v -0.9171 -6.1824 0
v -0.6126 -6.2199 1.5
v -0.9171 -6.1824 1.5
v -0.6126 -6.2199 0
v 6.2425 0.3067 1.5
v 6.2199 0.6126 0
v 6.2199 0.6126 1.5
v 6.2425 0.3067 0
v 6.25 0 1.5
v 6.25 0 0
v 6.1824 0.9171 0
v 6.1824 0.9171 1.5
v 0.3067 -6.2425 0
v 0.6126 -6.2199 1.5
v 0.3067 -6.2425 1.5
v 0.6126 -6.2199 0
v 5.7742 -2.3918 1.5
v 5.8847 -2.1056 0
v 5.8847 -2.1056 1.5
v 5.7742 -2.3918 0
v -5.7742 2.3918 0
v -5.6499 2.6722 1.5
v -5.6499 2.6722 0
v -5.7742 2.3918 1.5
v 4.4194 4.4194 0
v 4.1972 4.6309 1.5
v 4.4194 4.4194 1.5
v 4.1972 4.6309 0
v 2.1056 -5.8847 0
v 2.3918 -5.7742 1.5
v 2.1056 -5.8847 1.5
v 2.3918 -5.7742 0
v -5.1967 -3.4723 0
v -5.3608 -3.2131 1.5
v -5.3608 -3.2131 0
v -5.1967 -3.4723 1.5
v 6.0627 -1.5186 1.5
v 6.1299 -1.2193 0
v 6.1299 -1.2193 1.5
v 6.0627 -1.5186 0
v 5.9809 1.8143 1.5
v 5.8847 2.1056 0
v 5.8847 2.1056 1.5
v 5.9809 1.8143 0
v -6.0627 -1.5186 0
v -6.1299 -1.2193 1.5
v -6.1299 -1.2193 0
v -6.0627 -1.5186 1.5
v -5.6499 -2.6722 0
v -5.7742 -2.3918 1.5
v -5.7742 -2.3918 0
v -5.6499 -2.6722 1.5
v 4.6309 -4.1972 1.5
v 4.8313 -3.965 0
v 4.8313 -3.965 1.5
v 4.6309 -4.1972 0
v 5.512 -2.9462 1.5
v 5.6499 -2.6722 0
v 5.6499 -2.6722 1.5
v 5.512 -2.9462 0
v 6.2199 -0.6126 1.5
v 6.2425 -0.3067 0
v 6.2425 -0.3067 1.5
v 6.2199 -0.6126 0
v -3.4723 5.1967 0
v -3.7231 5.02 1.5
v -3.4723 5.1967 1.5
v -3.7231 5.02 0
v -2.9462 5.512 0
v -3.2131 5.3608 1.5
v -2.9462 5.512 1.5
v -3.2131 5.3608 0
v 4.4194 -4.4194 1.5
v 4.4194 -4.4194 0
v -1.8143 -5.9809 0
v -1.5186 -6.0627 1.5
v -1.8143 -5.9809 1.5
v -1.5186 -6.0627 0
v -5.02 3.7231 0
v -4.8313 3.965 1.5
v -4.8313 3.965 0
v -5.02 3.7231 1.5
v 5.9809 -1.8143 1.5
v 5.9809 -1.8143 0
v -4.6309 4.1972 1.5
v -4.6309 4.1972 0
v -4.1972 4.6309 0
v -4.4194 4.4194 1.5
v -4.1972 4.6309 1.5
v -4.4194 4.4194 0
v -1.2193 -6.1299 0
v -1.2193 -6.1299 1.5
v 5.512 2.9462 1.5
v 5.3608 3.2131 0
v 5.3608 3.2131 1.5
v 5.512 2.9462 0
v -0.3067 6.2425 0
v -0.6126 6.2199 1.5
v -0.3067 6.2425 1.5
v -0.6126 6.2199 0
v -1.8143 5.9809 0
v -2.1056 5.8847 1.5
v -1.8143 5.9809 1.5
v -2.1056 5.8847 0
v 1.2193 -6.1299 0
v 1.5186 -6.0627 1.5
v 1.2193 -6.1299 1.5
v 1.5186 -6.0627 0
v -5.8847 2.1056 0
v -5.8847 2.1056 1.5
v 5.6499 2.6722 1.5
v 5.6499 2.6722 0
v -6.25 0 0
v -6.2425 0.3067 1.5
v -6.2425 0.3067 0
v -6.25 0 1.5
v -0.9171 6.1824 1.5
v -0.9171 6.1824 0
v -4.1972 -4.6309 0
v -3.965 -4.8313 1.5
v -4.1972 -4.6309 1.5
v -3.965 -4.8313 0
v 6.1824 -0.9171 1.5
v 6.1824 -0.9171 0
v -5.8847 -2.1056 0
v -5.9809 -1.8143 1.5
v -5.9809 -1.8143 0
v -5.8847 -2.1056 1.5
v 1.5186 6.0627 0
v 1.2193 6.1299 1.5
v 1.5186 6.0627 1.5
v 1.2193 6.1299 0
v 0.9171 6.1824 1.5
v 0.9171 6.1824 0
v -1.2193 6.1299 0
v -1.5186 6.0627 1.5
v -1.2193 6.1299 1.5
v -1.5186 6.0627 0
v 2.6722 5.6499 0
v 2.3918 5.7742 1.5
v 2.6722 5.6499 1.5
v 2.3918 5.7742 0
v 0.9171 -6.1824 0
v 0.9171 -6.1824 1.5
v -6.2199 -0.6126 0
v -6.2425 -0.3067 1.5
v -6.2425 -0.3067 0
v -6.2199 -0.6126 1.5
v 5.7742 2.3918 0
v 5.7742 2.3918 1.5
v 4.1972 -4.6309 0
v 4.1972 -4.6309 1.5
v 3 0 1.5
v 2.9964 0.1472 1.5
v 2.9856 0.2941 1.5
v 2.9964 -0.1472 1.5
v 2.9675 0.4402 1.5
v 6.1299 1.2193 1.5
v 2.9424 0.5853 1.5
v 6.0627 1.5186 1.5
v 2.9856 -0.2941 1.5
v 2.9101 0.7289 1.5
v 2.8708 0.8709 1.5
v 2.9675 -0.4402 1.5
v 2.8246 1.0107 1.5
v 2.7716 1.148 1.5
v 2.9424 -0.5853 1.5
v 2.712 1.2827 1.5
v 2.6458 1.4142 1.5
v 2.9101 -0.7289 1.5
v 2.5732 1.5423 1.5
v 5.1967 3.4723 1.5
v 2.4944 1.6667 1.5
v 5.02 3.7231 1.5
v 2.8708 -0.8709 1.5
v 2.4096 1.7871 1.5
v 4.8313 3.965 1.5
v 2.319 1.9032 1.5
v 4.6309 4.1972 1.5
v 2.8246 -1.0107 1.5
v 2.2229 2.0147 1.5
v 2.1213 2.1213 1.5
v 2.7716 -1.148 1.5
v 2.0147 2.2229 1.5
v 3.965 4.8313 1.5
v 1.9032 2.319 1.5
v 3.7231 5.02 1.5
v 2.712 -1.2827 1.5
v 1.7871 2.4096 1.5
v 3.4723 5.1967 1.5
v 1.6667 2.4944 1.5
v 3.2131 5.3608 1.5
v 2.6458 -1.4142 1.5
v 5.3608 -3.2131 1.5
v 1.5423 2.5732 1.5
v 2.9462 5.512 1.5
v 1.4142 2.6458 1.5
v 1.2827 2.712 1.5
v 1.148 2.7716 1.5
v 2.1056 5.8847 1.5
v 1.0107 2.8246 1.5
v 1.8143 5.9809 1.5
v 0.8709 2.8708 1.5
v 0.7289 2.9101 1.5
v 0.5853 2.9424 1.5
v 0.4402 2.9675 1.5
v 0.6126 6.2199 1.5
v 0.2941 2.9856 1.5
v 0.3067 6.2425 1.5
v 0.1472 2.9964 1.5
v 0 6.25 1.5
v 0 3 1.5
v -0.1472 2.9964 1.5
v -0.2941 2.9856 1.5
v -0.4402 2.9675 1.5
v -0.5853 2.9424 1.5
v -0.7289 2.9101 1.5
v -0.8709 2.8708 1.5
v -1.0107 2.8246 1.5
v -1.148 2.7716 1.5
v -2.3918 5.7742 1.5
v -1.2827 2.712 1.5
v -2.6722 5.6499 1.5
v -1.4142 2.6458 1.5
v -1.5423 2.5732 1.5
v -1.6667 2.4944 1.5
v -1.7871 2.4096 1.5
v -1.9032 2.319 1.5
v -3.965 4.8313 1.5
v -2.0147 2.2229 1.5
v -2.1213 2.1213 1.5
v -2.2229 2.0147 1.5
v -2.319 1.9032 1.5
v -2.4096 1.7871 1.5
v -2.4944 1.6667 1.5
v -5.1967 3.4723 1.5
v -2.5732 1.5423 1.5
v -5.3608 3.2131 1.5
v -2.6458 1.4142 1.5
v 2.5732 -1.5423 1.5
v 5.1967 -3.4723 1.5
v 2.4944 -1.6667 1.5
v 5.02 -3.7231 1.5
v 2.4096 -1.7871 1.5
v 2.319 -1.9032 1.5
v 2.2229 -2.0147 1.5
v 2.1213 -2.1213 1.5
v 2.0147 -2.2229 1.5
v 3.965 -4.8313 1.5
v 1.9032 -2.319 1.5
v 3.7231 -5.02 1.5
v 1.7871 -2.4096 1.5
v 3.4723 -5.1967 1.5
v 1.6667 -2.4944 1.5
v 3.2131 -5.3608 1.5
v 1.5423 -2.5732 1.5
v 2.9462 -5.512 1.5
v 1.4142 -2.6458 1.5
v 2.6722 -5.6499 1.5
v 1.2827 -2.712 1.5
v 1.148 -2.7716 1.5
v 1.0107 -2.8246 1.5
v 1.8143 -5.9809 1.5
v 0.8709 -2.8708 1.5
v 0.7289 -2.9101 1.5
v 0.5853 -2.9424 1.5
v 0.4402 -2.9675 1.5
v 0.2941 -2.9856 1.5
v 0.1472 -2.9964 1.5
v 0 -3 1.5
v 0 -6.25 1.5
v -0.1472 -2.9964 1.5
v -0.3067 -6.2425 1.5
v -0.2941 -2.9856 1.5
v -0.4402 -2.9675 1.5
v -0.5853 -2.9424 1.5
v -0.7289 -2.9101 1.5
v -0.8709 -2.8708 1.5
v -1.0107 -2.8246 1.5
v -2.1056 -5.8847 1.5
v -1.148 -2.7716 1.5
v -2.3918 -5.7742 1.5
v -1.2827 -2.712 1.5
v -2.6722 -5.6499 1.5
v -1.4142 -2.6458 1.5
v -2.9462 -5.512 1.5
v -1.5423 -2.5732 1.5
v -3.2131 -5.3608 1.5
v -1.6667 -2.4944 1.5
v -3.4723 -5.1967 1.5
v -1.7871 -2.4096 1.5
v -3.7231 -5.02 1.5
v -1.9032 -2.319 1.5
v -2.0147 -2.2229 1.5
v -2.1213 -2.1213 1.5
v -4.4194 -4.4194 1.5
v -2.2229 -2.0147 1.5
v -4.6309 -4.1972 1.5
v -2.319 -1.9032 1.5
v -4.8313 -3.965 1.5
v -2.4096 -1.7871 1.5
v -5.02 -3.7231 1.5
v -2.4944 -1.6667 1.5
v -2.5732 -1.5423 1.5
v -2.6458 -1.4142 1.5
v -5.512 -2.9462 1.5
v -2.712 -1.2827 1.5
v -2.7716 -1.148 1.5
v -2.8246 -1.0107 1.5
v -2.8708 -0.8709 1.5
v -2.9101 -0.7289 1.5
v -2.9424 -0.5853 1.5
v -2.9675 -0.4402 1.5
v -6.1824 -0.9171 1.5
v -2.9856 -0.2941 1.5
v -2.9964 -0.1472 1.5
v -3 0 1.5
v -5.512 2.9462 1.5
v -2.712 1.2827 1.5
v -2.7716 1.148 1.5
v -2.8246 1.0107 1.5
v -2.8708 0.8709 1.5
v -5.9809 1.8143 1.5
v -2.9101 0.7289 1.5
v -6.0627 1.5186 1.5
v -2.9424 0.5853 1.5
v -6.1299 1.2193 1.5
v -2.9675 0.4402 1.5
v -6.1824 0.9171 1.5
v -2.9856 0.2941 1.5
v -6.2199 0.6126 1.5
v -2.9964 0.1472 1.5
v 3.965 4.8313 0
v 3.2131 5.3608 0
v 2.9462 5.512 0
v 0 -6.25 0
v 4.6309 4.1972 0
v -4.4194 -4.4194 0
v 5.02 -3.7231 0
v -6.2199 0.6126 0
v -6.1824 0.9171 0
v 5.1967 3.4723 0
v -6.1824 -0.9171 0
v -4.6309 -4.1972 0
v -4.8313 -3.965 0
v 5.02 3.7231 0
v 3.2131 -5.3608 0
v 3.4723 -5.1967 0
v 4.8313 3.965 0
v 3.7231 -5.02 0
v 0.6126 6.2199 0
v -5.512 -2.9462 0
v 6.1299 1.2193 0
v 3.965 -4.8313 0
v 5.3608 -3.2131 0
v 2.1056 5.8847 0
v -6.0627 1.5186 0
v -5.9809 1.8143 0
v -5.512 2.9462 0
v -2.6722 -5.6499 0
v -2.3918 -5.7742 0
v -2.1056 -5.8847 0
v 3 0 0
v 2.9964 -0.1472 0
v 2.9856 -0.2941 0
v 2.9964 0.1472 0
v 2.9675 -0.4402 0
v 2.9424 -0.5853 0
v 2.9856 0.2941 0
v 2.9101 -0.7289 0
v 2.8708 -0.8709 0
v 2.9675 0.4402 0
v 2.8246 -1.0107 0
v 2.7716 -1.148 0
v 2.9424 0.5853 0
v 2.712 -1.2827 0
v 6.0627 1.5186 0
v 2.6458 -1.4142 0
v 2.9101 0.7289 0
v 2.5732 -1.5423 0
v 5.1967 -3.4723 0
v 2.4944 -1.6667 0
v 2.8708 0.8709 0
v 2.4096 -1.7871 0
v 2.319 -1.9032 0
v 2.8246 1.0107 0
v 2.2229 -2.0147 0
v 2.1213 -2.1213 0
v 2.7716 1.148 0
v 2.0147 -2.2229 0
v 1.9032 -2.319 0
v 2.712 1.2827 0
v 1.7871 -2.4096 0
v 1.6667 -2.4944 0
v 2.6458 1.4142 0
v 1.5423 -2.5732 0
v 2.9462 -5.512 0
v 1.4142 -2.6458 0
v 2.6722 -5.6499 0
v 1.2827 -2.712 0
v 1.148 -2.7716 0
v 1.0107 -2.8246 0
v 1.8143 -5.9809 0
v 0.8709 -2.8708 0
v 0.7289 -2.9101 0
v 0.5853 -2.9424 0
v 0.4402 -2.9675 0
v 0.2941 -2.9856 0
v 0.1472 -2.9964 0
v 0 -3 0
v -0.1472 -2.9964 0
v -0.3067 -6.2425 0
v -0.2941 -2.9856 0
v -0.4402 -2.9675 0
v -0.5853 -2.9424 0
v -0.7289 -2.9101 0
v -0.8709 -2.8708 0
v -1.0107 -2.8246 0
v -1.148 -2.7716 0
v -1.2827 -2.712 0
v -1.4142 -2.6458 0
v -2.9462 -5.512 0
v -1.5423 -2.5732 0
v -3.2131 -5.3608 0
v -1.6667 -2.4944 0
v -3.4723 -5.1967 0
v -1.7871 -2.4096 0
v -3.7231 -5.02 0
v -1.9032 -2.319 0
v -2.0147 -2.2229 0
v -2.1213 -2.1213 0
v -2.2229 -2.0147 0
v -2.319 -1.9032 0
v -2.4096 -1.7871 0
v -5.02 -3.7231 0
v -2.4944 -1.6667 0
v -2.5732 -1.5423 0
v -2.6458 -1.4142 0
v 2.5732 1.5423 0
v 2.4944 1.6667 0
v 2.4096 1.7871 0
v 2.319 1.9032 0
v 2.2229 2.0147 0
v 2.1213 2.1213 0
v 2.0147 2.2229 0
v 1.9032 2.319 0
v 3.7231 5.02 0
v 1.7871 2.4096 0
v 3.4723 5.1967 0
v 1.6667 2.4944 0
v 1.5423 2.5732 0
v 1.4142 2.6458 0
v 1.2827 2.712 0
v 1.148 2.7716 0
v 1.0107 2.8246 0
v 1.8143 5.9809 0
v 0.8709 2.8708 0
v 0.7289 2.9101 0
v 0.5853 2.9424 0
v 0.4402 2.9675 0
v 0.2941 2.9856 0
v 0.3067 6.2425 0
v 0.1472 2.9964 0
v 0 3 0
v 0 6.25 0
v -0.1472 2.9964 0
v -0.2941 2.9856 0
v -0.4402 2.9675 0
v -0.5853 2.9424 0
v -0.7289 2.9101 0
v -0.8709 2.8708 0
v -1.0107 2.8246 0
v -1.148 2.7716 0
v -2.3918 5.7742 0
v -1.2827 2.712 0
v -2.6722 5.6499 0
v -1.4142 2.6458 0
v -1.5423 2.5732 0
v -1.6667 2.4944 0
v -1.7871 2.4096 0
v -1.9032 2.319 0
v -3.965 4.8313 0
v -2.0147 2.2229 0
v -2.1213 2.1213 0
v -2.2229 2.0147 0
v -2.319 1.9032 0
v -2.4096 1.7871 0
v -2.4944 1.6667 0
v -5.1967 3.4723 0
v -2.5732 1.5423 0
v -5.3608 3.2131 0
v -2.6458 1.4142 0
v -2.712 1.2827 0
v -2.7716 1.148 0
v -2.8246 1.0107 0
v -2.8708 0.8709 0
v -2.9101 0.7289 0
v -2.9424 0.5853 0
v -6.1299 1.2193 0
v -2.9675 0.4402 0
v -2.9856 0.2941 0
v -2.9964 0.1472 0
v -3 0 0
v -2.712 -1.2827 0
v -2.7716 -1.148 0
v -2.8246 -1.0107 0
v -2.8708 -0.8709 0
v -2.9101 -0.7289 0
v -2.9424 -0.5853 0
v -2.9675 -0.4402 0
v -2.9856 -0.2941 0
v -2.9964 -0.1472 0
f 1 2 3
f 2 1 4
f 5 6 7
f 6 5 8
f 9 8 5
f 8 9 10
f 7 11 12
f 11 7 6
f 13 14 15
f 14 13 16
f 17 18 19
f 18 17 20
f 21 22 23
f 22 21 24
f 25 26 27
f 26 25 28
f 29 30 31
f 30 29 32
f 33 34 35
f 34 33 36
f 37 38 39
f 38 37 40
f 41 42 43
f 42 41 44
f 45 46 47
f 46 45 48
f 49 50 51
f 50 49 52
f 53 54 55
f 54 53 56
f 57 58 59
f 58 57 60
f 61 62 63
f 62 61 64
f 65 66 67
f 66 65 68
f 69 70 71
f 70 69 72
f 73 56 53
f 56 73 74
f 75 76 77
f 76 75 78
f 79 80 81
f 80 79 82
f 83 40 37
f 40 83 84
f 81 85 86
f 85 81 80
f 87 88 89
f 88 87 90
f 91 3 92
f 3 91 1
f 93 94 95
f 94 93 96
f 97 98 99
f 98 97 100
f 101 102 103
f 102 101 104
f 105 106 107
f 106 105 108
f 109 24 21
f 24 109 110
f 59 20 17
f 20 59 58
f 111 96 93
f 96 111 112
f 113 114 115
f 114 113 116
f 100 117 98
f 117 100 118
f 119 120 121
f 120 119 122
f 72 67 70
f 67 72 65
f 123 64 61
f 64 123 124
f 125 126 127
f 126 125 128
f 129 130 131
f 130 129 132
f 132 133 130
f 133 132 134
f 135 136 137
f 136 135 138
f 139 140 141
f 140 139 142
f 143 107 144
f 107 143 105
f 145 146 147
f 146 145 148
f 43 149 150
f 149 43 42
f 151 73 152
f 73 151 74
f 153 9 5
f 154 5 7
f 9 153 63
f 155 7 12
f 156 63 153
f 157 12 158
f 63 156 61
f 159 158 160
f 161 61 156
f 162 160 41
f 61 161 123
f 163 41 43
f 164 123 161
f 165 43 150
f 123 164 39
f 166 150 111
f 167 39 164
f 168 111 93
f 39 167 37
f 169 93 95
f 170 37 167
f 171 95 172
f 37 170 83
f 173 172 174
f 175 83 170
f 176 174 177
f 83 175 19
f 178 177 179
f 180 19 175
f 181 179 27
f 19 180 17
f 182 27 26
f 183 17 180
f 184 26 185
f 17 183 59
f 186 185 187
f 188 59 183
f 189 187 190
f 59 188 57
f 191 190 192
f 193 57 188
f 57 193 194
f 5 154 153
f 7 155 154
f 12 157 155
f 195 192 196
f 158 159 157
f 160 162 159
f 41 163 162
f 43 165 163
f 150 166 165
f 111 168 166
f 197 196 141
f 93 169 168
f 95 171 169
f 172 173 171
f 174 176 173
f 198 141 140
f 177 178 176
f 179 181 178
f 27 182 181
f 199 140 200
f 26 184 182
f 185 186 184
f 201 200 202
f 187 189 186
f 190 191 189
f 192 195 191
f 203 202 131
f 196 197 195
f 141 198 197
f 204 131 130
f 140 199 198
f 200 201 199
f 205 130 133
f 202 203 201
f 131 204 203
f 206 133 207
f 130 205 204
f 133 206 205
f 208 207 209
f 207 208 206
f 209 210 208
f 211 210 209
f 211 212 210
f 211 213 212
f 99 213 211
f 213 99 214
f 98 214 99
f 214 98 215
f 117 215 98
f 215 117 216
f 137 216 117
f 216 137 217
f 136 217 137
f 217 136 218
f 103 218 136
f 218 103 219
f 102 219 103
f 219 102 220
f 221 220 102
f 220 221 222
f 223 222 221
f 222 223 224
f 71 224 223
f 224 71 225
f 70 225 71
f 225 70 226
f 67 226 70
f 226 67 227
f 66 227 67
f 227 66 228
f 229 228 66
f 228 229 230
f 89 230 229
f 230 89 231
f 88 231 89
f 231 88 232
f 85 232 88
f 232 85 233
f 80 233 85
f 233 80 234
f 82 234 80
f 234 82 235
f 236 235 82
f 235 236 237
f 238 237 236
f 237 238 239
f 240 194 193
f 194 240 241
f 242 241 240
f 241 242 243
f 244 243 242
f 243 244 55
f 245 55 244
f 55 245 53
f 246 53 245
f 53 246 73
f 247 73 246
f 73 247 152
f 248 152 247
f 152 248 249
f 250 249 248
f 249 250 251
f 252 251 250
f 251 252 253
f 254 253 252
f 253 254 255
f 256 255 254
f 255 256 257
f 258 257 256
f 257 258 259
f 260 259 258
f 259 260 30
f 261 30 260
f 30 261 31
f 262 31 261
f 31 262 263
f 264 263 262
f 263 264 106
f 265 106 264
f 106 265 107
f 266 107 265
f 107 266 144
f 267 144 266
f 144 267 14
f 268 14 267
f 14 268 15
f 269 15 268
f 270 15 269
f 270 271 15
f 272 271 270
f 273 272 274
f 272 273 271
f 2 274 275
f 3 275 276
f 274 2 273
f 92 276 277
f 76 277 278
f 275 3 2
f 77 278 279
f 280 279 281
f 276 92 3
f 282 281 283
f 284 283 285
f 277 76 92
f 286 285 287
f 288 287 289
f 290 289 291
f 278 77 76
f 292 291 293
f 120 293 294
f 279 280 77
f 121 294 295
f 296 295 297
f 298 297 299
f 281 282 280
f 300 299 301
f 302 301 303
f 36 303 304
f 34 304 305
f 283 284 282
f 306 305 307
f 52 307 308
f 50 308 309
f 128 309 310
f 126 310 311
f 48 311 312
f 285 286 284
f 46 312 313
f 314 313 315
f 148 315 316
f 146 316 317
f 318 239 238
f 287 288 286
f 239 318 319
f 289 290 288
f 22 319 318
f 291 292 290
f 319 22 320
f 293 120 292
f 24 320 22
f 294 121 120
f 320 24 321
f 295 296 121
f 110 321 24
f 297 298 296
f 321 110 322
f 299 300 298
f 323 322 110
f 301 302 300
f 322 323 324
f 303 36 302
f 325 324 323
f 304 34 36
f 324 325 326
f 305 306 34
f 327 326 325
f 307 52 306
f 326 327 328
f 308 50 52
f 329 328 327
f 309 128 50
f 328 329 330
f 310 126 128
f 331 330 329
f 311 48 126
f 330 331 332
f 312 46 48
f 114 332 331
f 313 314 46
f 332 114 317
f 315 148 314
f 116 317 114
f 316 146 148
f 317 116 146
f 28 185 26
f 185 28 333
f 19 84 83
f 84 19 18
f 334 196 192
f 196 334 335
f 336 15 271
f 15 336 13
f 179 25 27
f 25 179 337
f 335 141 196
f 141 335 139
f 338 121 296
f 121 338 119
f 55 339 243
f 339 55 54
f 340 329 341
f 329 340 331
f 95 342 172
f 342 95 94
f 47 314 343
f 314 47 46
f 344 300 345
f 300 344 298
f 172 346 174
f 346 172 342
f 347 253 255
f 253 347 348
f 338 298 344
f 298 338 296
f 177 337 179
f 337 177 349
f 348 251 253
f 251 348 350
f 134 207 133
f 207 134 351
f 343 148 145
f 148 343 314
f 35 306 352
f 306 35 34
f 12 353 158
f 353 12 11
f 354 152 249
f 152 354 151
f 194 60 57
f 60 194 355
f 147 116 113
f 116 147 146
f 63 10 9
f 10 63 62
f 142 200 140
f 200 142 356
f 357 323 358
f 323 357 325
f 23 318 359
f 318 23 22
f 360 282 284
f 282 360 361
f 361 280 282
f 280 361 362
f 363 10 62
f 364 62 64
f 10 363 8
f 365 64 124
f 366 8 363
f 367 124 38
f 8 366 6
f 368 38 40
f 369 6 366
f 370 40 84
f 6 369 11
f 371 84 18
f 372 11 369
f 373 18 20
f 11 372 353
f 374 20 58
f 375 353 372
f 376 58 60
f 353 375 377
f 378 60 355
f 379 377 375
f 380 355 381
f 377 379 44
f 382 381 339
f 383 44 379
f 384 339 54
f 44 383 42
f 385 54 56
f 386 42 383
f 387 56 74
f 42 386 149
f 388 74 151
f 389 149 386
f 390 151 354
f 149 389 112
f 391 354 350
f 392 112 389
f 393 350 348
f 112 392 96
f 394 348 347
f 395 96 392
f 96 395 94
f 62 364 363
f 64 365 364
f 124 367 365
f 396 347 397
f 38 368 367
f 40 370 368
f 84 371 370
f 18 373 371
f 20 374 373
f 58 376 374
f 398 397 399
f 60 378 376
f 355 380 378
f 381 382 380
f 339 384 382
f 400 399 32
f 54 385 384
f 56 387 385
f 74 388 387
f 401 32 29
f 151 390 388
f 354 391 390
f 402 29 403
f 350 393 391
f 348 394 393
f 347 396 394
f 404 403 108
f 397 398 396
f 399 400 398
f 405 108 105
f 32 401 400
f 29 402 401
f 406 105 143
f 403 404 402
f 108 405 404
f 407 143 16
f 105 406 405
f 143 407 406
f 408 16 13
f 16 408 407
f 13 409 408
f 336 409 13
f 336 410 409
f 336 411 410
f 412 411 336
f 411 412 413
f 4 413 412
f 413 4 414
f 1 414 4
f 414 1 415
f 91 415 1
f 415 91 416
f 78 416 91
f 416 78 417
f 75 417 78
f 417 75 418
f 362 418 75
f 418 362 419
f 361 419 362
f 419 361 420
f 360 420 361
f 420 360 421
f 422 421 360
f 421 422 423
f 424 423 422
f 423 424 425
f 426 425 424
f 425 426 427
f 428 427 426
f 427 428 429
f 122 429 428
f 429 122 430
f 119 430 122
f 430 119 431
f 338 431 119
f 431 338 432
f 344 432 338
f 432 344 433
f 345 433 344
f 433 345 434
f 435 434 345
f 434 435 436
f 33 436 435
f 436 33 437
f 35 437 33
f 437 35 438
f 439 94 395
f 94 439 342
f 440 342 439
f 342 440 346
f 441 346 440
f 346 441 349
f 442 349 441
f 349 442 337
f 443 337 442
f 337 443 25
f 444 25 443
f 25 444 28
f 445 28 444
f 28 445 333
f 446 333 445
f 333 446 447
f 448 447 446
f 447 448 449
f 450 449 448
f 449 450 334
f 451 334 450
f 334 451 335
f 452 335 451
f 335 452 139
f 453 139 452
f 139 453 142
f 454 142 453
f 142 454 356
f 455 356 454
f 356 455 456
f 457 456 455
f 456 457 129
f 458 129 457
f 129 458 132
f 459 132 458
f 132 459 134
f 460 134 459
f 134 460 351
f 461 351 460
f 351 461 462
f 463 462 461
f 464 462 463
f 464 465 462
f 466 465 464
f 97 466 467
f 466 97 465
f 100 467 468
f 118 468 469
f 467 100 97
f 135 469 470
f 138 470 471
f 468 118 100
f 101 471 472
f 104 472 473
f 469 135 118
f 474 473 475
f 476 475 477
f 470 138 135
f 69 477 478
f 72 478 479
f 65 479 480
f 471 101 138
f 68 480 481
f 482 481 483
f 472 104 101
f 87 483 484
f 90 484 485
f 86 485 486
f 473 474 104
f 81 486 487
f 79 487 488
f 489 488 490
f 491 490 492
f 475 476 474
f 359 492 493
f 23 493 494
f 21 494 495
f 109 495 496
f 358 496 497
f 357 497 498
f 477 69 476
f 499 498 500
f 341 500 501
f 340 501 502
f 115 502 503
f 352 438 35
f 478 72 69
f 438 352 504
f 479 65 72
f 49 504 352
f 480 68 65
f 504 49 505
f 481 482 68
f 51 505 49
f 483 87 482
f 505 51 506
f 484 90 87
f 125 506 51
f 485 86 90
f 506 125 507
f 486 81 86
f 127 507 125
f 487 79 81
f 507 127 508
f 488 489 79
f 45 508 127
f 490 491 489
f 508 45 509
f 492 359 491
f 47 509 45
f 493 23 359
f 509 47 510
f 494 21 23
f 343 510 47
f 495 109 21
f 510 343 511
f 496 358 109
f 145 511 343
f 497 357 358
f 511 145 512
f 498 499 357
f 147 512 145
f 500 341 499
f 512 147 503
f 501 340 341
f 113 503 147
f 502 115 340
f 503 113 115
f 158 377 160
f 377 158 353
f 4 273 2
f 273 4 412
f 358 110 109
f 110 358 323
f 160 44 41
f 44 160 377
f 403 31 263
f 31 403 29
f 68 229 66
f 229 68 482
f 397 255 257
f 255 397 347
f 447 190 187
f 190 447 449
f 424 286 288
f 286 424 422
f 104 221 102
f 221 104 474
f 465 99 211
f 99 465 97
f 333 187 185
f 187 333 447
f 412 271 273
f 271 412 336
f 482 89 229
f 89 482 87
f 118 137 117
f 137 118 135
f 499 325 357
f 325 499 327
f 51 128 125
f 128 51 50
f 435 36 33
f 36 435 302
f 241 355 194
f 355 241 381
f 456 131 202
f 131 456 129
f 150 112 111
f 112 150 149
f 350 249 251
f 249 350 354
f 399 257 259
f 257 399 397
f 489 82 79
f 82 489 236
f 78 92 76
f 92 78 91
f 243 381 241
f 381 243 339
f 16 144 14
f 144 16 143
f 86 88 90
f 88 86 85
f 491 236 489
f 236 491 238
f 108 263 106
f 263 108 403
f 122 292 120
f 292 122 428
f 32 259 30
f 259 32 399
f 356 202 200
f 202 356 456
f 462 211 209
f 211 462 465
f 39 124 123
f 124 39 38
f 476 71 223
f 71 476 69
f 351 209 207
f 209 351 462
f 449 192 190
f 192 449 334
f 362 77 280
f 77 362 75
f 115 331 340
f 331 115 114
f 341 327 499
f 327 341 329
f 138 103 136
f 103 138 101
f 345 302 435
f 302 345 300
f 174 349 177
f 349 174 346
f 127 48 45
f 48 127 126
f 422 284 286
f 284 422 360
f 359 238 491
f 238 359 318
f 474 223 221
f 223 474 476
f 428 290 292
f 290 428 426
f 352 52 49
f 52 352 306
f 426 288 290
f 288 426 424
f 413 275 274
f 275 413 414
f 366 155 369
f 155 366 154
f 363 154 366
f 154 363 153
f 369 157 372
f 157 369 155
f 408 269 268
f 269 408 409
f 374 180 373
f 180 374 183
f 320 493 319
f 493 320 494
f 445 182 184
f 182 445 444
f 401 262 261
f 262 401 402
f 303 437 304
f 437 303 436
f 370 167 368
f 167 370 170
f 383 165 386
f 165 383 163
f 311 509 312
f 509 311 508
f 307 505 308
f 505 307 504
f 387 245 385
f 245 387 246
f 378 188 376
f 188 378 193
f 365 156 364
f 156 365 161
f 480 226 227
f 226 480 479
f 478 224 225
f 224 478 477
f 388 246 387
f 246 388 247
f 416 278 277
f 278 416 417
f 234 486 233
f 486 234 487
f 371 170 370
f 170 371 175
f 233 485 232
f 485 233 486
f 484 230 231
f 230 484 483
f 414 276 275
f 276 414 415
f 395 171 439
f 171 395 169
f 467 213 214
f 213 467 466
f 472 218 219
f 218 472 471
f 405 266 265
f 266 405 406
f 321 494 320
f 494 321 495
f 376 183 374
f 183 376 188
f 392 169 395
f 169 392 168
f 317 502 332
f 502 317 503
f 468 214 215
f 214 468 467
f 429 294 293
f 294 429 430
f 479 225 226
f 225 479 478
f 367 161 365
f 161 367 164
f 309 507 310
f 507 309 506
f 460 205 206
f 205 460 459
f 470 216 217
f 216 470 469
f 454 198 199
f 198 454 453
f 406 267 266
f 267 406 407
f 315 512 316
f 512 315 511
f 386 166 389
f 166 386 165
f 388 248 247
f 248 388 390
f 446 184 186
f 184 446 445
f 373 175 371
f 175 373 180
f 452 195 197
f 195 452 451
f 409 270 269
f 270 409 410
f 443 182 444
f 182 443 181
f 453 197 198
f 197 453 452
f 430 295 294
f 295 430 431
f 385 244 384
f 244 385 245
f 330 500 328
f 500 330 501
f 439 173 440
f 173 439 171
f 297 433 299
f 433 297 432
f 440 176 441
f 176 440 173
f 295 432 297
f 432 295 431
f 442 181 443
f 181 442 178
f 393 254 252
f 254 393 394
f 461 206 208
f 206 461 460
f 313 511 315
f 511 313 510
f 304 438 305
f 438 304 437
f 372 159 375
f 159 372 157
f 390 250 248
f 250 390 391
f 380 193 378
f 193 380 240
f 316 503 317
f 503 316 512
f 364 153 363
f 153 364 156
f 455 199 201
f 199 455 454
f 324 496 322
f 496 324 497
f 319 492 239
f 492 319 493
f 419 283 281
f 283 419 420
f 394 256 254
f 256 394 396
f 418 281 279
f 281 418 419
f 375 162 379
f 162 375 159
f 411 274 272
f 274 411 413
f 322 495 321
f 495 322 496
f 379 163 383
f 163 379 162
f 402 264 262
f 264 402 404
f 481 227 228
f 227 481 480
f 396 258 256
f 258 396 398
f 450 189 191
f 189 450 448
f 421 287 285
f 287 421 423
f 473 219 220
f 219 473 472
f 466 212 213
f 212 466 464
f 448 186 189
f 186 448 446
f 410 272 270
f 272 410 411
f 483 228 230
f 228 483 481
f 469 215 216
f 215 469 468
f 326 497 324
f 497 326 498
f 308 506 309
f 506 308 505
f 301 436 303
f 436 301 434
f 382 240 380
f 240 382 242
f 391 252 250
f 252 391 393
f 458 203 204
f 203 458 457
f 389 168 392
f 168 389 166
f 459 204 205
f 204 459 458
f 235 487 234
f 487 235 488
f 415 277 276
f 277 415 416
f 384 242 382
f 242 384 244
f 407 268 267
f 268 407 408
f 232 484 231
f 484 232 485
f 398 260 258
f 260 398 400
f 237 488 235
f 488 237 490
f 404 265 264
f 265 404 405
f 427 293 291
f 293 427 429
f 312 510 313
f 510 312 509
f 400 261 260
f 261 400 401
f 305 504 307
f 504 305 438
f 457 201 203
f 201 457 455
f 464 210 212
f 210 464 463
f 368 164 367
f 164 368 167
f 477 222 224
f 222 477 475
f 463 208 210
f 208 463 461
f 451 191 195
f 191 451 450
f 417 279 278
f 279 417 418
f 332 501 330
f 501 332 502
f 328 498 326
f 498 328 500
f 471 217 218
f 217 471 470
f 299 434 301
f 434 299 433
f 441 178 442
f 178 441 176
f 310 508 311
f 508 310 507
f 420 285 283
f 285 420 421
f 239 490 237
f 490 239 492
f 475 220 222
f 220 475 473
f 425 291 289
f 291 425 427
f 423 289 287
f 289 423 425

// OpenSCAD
$fn = 128;

inner_d = 6.0;
outer_d = 12.5;
thickness = 1.5;

difference() {
  cylinder(d = outer_d, h = thickness);
  translate([0, 0, -0.1])
    cylinder(d = inner_d, h = thickness + 0.2);
}
